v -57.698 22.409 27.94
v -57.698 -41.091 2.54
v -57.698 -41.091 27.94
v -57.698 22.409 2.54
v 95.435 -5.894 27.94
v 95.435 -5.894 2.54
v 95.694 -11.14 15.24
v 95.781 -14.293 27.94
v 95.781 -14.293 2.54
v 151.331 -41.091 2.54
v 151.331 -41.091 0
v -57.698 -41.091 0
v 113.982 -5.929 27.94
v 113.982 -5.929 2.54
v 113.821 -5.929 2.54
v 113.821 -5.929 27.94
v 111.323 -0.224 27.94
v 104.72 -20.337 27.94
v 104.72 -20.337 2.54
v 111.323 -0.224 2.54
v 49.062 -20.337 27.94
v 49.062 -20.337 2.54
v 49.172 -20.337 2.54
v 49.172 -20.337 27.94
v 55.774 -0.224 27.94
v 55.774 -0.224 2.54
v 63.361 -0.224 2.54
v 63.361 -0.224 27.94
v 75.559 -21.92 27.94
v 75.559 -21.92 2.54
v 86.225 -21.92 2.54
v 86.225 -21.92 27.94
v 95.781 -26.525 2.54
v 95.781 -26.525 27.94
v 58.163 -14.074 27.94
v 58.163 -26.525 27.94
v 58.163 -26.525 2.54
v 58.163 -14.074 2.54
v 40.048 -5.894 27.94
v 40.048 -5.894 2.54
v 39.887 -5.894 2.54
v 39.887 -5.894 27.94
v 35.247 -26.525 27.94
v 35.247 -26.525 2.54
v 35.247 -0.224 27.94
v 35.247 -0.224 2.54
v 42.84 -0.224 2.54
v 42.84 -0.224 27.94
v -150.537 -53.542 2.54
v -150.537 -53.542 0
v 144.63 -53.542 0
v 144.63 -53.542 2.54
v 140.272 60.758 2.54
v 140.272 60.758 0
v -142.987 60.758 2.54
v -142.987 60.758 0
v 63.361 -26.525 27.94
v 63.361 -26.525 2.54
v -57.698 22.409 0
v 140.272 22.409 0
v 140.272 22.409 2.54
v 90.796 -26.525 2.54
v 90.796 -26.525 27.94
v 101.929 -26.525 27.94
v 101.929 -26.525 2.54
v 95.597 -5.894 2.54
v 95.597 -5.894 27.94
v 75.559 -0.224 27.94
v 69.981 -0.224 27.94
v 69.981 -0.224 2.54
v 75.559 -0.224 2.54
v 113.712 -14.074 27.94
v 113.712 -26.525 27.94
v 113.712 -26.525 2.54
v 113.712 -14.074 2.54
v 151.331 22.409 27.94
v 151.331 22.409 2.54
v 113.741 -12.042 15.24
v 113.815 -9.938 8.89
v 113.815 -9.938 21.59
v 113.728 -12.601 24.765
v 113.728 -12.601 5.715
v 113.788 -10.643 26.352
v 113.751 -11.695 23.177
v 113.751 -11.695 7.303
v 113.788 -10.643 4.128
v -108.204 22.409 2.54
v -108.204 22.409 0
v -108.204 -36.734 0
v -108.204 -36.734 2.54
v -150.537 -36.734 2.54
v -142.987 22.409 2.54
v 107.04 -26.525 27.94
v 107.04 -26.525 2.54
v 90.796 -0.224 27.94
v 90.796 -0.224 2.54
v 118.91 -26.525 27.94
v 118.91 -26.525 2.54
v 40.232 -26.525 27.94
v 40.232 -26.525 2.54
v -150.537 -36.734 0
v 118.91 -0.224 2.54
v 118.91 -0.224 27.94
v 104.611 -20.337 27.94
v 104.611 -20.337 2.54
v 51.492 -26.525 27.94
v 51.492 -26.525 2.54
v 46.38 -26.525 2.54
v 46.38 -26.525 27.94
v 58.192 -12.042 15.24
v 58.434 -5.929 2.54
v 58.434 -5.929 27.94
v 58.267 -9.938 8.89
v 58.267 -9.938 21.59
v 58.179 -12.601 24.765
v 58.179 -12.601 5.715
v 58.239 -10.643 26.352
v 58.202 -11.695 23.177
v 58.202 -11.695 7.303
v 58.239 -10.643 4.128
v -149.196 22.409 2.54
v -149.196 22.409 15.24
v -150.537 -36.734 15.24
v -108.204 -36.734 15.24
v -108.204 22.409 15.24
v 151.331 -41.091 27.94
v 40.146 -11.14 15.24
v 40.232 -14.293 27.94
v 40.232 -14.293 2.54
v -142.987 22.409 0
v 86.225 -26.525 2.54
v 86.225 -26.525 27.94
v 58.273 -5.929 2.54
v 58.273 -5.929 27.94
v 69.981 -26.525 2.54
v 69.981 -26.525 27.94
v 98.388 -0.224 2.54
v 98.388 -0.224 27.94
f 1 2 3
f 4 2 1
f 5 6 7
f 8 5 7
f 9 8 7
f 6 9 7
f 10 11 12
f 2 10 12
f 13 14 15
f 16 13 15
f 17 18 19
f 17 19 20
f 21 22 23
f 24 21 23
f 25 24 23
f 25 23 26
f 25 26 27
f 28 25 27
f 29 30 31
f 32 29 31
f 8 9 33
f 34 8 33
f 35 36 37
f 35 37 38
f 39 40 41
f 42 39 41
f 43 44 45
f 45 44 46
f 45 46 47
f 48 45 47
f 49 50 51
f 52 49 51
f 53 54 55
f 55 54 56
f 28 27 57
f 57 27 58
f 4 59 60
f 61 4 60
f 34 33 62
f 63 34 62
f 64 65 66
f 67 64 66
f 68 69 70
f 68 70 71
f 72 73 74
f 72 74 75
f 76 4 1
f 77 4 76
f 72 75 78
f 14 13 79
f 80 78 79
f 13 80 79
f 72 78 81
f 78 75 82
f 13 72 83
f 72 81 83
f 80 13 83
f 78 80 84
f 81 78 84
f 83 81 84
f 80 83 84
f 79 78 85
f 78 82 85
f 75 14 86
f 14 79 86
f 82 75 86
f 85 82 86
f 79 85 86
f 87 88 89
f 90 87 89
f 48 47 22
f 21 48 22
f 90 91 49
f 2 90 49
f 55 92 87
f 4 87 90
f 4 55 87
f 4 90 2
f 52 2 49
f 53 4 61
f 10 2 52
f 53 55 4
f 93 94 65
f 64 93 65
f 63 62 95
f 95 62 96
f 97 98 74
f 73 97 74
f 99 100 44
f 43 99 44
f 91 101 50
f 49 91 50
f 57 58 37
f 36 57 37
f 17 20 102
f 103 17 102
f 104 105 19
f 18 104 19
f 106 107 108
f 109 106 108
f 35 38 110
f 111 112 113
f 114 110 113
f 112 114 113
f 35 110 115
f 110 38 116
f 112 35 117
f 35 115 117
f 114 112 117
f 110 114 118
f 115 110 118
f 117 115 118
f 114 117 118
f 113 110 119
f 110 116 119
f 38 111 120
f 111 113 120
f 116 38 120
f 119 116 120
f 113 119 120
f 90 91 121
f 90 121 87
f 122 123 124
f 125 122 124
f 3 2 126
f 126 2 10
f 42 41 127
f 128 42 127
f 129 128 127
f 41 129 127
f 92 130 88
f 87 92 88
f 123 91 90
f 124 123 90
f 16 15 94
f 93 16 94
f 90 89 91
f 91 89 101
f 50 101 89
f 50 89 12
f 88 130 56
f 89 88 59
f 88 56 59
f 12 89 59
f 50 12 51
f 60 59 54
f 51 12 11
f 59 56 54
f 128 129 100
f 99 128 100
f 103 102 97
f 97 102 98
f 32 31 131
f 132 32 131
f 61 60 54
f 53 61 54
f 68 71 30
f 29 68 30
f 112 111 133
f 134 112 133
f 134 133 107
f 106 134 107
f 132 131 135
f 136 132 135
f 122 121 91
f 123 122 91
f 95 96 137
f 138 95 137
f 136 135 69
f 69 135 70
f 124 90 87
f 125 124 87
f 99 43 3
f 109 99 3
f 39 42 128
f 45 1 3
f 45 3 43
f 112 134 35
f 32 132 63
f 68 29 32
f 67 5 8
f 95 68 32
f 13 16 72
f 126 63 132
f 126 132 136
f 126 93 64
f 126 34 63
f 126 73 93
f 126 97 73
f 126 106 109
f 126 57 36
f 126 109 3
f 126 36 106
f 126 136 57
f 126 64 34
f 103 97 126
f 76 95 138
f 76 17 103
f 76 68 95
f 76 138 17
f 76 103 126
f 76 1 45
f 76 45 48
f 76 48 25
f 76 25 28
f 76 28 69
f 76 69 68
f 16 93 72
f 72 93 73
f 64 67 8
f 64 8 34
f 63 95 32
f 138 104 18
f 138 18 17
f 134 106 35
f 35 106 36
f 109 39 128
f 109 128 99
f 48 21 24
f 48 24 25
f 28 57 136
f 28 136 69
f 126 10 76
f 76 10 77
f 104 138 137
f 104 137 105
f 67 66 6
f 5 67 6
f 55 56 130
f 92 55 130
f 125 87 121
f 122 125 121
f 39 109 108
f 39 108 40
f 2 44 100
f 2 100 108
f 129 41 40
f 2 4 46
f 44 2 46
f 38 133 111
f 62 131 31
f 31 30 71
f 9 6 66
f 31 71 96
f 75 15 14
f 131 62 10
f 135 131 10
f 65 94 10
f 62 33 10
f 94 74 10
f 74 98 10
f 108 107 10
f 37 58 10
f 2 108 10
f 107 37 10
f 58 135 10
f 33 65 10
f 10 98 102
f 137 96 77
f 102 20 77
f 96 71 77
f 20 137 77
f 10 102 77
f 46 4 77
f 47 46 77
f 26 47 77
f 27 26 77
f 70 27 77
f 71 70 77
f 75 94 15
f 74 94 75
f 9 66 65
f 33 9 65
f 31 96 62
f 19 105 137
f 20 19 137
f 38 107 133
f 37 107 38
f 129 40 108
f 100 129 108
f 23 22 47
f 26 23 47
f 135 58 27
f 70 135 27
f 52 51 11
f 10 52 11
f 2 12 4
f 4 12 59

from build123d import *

# Parameters (mm, degrees)
F1_DEPTH = 2.54
F2_W     = 209.0289330468
F2_H     = 63.5
F3_DEPTH = 25.4
F5_DEPTH = 12.7


with BuildPart() as f1:
    # F0 (on Top) → F1 (new body)
    with BuildSketch(Plane.XY):
        Polygon((-150.5374759429, -36.733612048), (-150.5374759429, -53.5424363695), (144.6302120238, -53.5424363695), (151.3307016242, -41.091453577), (-57.6982314226, -41.091453577), (-57.6982314226, 22.408546423), (140.2723704948, 22.408546423), (140.2723704948, 60.7575636305), (-142.9874562062, 60.7575636305), (-142.9874562062, 22.408546423), (-108.2041540353, 22.408546423), (-108.2041540353, -36.733612048), align=None)
    extrude(amount=F1_DEPTH)


with BuildPart() as f3:
    # F2 (on face) → F3 (new body)
    with BuildSketch(Plane.XY.offset(2.54)):
        with Locations((46.8162351008, -9.341453577)):
            Rectangle(F2_W, F2_H)
        with BuildLine():
            Line((51.4916315393, -26.5251472592), (46.3800146196, -26.5251472592))
            Line((46.3800146196, -26.5251472592), (40.0480567235, -5.8944771687))
            Line((40.0480567235, -5.8944771687), (39.8868796134, -5.8944771687))
            add(Edge.make_bspline(
                [(39.8868796134, -5.8944771687), (40.232259135, -12.1861407873), (40.232259135, -14.2929558691)],
                knots=[0, 0, 0, 1, 1, 1], degree=2))
            Line((40.232259135, -14.2929558691), (40.232259135, -26.5251472592))
            Line((40.232259135, -26.5251472592), (35.2472813732, -26.5251472592))
            Line((35.2472813732, -26.5251472592), (35.2472813732, -0.224496689))
            Line((35.2472813732, -0.224496689), (42.8398745231, -0.224496689))
            Line((42.8398745231, -0.224496689), (49.0624622374, -20.3370974972))
            Line((49.0624622374, -20.3370974972), (49.1718324192, -20.3370974972))
            Line((49.1718324192, -20.3370974972), (55.7743376072, -0.224496689))
            Line((55.7743376072, -0.224496689), (63.3611744318, -0.224496689))
            Line((63.3611744318, -0.224496689), (63.3611744318, -26.5251472592))
            Line((63.3611744318, -26.5251472592), (58.1632126317, -26.5251472592))
            Line((58.1632126317, -26.5251472592), (58.1632126317, -14.0742155054))
            add(Edge.make_bspline(
                [(58.1632126317, -14.0742155054), (58.1632126317, -13.1934977253), (58.1919942585, -12.0422326533)],
                knots=[0, 0, 0, 1, 1, 1], degree=2))
            add(Edge.make_bspline(
                [(58.1919942585, -12.0422326533), (58.2207758853, -10.8909675813), (58.4337599236, -5.9290151209)],
                knots=[0, 0, 0, 1, 1, 1], degree=2))
            Line((58.4337599236, -5.9290151209), (58.2725828135, -5.9290151209))
            Line((58.2725828135, -5.9290151209), (51.4916315393, -26.5251472592))
        make_face(mode=Mode.SUBTRACT)
        Polygon((86.225298762, -26.5251472592), (69.9809485959, -26.5251472592), (69.9809485959, -0.224496689), (75.5588278698, -0.224496689), (75.5588278698, -21.9200869712), (86.225298762, -21.9200869712), align=None, mode=Mode.SUBTRACT)
        with BuildLine():
            Line((107.0401712641, -26.5251472592), (101.9285543443, -26.5251472592))
            Line((101.9285543443, -26.5251472592), (95.5965964483, -5.8944771687))
            Line((95.5965964483, -5.8944771687), (95.4354193382, -5.8944771687))
            add(Edge.make_bspline(
                [(95.4354193382, -5.8944771687), (95.7807988598, -12.1861407873), (95.7807988598, -14.2929558691)],
                knots=[0, 0, 0, 1, 1, 1], degree=2))
            Line((95.7807988598, -14.2929558691), (95.7807988598, -26.5251472592))
            Line((95.7807988598, -26.5251472592), (90.795821098, -26.5251472592))
            Line((90.795821098, -26.5251472592), (90.795821098, -0.224496689))
            Line((90.795821098, -0.224496689), (98.3884142479, -0.224496689))
            Line((98.3884142479, -0.224496689), (104.6110019621, -20.3370974972))
            Line((104.6110019621, -20.3370974972), (104.720372144, -20.3370974972))
            Line((104.720372144, -20.3370974972), (111.322877332, -0.224496689))
            Line((111.322877332, -0.224496689), (118.9097141566, -0.224496689))
            Line((118.9097141566, -0.224496689), (118.9097141566, -26.5251472592))
            Line((118.9097141566, -26.5251472592), (113.7117523564, -26.5251472592))
            Line((113.7117523564, -26.5251472592), (113.7117523564, -14.0742155054))
            add(Edge.make_bspline(
                [(113.7117523564, -14.0742155054), (113.7117523564, -13.1934977253), (113.7405339832, -12.0422326533)],
                knots=[0, 0, 0, 1, 1, 1], degree=2))
            add(Edge.make_bspline(
                [(113.7405339832, -12.0422326533), (113.76931561, -10.8909675813), (113.9822996483, -5.9290151209)],
                knots=[0, 0, 0, 1, 1, 1], degree=2))
            Line((113.9822996483, -5.9290151209), (113.8211225383, -5.9290151209))
            Line((113.8211225383, -5.9290151209), (107.0401712641, -26.5251472592))
        make_face(mode=Mode.SUBTRACT)
    extrude(amount=F3_DEPTH)


with BuildPart() as f5:
    # F4 (on face) → F5 (new body)
    with BuildSketch(Plane.XY.offset(2.54)):
        Polygon((-108.2041540353, 22.408546423), (-136.159107089, 22.408546423), (-149.1957902908, 22.408546423), (-150.5374759429, -36.733612048), (-108.2041540353, -36.733612048), align=None)
    extrude(amount=F5_DEPTH)


solid = Compound([f1.part, f3.part, f5.part])
